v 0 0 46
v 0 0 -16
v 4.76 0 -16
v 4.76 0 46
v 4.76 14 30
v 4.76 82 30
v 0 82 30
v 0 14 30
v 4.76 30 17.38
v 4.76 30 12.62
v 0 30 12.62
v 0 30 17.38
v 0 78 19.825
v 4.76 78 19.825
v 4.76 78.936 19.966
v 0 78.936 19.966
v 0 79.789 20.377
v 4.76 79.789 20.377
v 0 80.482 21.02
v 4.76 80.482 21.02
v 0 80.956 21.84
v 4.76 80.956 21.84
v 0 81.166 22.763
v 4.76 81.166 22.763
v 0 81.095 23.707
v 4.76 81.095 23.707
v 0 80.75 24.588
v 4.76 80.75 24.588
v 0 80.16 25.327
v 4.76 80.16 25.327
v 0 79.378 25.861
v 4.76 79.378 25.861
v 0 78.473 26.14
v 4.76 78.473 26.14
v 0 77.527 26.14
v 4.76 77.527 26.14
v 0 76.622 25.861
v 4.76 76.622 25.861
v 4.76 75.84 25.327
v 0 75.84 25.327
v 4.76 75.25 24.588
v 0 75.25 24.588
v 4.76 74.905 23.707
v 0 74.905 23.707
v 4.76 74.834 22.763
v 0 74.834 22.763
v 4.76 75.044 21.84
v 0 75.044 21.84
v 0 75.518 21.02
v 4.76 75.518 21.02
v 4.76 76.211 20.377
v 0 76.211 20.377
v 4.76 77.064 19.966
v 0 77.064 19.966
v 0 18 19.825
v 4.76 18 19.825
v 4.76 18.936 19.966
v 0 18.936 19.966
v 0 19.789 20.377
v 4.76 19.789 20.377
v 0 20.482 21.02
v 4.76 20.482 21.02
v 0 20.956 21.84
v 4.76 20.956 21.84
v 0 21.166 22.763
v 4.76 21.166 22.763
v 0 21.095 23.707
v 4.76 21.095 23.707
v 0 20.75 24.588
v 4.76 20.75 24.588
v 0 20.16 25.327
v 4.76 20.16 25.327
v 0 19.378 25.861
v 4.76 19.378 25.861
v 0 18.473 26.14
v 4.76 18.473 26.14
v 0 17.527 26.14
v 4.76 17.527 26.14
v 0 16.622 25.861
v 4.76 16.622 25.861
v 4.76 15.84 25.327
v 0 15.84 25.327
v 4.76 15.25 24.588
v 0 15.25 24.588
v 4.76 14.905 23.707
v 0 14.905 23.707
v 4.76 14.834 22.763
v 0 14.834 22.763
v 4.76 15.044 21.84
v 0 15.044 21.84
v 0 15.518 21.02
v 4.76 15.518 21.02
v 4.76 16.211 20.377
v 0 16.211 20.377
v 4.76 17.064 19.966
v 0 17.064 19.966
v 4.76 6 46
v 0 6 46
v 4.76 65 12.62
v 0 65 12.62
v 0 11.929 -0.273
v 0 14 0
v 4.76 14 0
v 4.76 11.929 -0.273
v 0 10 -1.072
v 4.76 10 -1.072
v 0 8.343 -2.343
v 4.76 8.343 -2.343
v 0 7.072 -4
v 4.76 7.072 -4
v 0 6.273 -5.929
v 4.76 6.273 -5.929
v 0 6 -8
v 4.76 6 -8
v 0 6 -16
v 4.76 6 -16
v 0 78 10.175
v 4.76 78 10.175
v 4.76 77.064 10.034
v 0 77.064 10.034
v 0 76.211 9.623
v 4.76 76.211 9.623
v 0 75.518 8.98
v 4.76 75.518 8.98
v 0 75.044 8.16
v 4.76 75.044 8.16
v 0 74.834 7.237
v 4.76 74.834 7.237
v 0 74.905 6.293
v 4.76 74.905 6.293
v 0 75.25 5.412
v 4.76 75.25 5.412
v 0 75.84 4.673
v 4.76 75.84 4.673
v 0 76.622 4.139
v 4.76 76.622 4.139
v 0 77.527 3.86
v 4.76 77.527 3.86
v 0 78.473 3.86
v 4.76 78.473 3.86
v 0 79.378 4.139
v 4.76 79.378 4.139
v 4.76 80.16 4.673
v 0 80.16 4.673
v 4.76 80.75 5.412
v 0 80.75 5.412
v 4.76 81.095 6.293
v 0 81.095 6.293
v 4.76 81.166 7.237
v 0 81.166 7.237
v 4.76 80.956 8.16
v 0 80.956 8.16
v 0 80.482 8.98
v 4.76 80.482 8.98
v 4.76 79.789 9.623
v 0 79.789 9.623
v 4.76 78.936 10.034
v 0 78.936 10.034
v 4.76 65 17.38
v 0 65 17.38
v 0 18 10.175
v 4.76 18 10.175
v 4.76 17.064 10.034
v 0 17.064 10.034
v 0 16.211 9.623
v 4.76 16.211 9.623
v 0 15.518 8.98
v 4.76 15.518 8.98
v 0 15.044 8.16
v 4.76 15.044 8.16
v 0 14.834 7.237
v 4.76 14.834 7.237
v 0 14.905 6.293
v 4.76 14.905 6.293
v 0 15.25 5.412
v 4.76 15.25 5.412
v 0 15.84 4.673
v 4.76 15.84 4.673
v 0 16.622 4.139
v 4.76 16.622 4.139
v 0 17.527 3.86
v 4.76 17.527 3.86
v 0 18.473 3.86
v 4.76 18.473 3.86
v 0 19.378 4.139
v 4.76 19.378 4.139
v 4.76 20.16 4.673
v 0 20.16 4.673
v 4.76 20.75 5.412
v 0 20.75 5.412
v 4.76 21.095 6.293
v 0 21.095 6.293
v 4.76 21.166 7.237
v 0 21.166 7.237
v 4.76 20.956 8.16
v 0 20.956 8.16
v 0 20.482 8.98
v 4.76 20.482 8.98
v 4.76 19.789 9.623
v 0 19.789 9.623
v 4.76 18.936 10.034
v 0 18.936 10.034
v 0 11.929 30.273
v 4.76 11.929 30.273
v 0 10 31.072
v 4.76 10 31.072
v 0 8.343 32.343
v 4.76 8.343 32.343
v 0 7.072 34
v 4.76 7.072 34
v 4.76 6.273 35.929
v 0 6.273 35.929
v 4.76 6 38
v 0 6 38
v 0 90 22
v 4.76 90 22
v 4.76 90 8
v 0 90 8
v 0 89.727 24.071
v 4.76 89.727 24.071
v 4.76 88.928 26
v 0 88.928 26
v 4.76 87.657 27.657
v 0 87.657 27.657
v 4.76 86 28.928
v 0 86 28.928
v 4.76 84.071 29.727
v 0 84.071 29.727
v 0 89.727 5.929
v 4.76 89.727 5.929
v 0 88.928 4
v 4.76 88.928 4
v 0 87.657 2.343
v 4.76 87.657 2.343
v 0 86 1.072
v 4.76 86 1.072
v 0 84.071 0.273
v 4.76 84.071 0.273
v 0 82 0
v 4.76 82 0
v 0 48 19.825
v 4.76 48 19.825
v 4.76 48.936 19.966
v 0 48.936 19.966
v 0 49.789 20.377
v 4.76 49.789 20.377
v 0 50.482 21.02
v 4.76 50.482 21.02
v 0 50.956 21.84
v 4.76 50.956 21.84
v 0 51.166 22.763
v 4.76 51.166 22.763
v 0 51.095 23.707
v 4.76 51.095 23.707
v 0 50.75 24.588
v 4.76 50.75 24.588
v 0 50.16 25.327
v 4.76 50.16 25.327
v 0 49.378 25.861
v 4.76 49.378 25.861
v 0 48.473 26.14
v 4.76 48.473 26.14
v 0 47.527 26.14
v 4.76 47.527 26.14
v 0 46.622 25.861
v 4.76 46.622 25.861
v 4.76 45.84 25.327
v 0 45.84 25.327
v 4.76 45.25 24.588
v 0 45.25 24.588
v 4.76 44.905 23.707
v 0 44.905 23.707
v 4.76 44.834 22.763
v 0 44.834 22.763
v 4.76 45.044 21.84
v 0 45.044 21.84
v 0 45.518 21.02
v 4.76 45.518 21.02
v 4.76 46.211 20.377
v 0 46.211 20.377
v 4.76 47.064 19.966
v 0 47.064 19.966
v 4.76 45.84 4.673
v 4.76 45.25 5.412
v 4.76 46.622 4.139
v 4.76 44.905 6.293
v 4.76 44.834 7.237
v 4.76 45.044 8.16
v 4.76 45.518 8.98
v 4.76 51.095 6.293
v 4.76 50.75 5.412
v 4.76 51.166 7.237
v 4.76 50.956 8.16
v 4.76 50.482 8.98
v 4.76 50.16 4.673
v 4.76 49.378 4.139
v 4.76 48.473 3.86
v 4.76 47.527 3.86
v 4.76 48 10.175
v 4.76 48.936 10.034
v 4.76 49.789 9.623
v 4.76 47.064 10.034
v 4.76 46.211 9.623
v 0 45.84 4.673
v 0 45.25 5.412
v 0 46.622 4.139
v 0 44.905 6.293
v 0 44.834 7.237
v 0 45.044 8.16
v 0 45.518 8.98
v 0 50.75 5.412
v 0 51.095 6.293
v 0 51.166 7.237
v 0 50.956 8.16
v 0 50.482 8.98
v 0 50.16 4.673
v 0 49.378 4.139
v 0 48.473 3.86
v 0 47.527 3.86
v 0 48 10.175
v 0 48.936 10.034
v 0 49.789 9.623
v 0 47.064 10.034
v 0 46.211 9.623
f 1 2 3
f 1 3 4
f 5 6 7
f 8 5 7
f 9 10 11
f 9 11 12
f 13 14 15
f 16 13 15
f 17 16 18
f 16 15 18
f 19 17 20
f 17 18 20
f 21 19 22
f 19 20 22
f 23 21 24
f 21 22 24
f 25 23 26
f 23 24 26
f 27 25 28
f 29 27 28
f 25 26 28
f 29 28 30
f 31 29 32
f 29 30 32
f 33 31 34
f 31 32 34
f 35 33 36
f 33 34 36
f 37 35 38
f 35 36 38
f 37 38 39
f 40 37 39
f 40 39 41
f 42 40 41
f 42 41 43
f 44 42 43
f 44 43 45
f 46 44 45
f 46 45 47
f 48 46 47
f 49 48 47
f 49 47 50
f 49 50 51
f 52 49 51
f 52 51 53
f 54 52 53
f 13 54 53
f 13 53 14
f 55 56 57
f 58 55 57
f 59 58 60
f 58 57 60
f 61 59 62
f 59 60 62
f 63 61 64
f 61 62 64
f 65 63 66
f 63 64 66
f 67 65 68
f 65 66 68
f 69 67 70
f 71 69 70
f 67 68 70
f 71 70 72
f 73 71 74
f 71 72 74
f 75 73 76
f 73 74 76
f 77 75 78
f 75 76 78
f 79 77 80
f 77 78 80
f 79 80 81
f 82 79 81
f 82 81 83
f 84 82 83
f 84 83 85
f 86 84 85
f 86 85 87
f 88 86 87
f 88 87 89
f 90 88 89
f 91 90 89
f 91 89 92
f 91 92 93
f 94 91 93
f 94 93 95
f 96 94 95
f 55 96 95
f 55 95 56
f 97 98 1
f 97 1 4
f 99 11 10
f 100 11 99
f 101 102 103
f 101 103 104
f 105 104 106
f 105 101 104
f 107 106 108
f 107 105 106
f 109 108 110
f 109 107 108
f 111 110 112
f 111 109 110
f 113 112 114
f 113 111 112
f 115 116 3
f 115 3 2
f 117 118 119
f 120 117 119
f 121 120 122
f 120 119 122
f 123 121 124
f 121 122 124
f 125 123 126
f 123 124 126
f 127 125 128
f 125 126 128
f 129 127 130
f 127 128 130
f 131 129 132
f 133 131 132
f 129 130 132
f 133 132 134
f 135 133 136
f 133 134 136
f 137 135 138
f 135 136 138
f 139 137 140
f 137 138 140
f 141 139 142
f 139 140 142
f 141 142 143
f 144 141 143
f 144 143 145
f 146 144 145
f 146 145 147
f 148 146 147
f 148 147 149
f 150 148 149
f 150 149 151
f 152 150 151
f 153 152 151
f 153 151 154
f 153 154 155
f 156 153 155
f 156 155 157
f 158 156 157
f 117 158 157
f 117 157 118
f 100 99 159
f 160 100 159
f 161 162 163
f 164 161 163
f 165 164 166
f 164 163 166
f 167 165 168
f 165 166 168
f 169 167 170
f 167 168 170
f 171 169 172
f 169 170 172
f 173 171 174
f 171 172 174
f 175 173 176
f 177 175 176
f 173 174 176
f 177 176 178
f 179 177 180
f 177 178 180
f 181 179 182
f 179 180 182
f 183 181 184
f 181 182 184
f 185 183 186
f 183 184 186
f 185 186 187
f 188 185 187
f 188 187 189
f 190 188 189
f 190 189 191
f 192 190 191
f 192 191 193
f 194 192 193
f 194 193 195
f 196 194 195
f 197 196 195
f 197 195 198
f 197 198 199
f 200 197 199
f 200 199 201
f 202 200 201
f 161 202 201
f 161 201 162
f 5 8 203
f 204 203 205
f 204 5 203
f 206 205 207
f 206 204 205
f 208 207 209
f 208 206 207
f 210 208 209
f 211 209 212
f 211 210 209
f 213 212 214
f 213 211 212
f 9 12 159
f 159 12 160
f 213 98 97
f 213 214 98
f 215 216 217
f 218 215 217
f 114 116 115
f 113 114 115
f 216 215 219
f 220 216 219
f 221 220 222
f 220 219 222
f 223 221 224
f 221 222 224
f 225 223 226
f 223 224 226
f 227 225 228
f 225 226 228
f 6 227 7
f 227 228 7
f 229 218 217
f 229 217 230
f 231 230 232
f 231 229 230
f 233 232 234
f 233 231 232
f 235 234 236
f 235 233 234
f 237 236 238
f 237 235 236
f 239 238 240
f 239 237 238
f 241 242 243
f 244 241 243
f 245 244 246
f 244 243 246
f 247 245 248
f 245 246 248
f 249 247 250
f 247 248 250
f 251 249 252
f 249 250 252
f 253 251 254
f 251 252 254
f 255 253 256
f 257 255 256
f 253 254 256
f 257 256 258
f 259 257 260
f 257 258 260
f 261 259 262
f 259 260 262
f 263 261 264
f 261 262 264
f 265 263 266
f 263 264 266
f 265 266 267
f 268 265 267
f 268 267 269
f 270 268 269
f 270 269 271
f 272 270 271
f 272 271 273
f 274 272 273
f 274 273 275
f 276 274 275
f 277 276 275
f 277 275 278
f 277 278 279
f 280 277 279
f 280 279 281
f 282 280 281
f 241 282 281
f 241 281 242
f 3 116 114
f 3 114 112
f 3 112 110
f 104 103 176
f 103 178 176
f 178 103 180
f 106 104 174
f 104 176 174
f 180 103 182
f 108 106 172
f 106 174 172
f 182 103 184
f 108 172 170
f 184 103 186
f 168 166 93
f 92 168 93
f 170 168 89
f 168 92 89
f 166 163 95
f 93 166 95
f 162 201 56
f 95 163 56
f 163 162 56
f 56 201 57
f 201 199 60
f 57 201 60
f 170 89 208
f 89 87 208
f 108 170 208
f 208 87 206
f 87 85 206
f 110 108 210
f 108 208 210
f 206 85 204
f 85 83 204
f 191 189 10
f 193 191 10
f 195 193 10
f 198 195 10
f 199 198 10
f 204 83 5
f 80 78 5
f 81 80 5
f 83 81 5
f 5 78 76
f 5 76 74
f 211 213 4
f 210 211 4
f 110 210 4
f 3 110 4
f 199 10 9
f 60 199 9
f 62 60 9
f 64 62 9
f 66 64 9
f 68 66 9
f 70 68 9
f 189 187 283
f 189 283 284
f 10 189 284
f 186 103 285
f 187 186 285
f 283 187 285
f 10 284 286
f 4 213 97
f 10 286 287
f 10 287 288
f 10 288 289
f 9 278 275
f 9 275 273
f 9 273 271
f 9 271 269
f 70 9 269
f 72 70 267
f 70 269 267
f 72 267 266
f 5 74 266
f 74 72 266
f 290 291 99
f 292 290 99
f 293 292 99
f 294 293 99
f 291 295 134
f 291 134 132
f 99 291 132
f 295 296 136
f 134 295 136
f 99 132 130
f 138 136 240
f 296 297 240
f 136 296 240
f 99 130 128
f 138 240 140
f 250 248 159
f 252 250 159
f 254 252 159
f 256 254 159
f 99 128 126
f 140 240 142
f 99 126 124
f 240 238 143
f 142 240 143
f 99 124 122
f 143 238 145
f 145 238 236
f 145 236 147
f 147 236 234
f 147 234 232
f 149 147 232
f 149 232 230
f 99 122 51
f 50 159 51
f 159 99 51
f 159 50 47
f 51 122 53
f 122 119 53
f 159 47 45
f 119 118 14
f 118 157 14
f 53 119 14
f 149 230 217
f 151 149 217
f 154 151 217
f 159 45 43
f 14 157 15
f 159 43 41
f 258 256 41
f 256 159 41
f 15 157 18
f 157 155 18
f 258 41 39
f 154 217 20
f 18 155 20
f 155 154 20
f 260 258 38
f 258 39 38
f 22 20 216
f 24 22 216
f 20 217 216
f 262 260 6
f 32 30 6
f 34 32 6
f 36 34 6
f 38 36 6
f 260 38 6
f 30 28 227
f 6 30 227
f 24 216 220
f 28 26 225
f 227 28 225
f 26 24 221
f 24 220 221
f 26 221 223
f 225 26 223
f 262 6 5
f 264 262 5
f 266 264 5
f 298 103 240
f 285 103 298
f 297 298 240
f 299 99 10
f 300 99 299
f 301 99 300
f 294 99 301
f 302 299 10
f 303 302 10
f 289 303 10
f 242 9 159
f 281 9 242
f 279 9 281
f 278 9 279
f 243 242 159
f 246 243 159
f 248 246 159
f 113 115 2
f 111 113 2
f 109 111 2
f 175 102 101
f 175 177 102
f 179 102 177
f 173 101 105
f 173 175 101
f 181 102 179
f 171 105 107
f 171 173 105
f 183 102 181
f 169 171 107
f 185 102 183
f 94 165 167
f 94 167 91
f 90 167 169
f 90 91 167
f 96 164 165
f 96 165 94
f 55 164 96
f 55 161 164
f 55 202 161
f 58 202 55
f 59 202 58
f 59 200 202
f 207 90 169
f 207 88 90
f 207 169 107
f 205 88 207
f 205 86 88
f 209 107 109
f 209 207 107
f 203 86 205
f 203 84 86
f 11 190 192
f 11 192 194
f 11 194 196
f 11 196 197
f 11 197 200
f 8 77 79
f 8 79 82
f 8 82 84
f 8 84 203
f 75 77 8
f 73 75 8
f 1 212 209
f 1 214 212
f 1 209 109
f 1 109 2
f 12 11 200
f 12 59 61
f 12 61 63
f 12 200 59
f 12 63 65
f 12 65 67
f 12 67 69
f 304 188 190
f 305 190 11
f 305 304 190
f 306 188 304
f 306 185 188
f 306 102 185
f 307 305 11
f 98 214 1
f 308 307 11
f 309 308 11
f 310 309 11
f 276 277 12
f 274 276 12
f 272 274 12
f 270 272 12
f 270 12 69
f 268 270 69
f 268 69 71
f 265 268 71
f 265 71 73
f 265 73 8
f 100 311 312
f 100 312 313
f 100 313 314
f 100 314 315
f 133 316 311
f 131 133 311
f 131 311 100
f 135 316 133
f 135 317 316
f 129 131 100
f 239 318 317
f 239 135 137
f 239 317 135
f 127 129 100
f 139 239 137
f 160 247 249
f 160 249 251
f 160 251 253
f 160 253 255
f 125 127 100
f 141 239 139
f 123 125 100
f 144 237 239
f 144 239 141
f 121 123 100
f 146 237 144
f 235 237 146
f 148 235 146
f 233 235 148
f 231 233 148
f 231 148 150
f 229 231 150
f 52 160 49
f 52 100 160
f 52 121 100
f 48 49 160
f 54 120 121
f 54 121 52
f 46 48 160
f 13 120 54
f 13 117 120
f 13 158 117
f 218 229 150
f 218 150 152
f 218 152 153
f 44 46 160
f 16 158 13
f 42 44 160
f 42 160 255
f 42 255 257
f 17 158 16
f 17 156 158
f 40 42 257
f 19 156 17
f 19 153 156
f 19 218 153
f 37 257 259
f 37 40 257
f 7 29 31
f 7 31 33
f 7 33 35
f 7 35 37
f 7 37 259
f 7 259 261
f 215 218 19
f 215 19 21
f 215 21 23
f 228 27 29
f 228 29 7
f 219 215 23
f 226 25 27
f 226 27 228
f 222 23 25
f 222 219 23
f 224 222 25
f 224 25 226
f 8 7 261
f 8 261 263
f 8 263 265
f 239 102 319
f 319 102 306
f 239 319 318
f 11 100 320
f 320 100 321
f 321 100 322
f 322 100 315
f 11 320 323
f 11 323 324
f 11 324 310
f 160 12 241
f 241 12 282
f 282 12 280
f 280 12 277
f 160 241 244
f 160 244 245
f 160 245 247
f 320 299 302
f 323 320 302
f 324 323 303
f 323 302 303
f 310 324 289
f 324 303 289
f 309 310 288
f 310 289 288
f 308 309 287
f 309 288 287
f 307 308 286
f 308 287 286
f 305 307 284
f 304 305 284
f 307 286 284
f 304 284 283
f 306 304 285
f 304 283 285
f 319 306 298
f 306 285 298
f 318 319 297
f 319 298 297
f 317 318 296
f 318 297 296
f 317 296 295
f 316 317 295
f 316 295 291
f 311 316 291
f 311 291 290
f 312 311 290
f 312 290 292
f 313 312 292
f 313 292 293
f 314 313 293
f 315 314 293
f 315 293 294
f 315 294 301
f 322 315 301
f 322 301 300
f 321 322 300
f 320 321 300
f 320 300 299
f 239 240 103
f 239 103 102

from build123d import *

# Parameters (mm, degrees)
RESSALTO_EXTRUS_O1_DEPTH   = 30
ESBO_O2_W                  = 12
ESBO_O2_H                  = 94
CORTE_EXTRUS_O1_DEPTH      = 118.541482039
ESBO_O3_W                  = 30
ESBO_O3_H                  = 10
CORTE_EXTRUS_O2_DEPTH      = 118.541482039
ESBO_O4_W                  = 3.6
ESBO_O4_H                  = 30
CORTE_EXTRUS_O3_DEPTH      = 108.498837203
ESBO_O5_W                  = 56.4
ESBO_O5_H                  = 6
RESSALTO_EXTRUS_O2_DEPTH   = 16
ESBO_O6_W                  = 56.4
ESBO_O6_H                  = 6
RESSALTO_EXTRUS_O3_DEPTH   = 16
FILETE1_R                  = 8
FILETE2_R                  = 8
FILETE3_R                  = 8
FILETE4_R                  = 4
ESBO_O7_R                  = 3.175
CORTE_EXTRUS_O4_DEPTH      = 113.943171551
ESBO_O8_R                  = 3.25
CORTE_EXTRUS_O5_DEPTH      = 112.143870726
CORTE_EXTRUS_O6_DEPTH      = 113.943171551
CORTE_EXTRUS_O6_DEPTH_BACK = 1.24
ESBO_O9_W                  = 62
ESBO_O9_H                  = 90
ESBO_O10_W                 = 4.76
ESBO_O10_H                 = 130
CORTE_EXTRUS_O7_DEPTH      = 102.186252031
ESBO_O11_W                 = 4.76
ESBO_O11_H                 = 30
RESSALTO_EXTRUS_O4_DEPTH   = 4.76


with BuildPart() as part:
    # Esboço1 → Ressalto-extrusão1 (new body)
    with BuildSketch(Plane.XY):
        Polygon((0, 0), (0, 100), (60, 0), align=None)
    extrude(amount=RESSALTO_EXTRUS_O1_DEPTH)

    # Esboço2 → Corte-extrusão1 (cut, through all)
    with BuildSketch(Plane.ZY.offset(-6)):
        with Locations((24, 53)):
            Rectangle(ESBO_O2_W, ESBO_O2_H)
        with Locations((6, 53)):
            Rectangle(ESBO_O2_W, ESBO_O2_H)
    extrude(amount=-CORTE_EXTRUS_O1_DEPTH, mode=Mode.SUBTRACT)

    # Esboço3 → Corte-extrusão2 (cut, through all)
    with BuildSketch(Plane(origin=(6, 0, 0), x_dir=(0, 0, -1), z_dir=(1, 0, 0))):
        with Locations((-15, 95)):
            Rectangle(ESBO_O3_W, ESBO_O3_H)
    extrude(amount=-CORTE_EXTRUS_O2_DEPTH, mode=Mode.SUBTRACT)

    # Esboço4 → Corte-extrusão3 (cut, through all)
    with BuildSketch(Plane(origin=(0, 6, 0), x_dir=(1, 0, 0), z_dir=(0, 1, 0))):
        with Locations((58.2, -15)):
            Rectangle(ESBO_O4_W, ESBO_O4_H)
    extrude(amount=-CORTE_EXTRUS_O3_DEPTH, mode=Mode.SUBTRACT)

    # Esboço5 → Ressalto-extrusão2 (add)
    with BuildSketch(Plane.XY.offset(30)):
        with Locations((28.2, 3)):
            Rectangle(ESBO_O5_W, ESBO_O5_H)
    extrude(amount=RESSALTO_EXTRUS_O2_DEPTH)

    # Esboço6 → Ressalto-extrusão3 (add)
    with BuildSketch(Plane(origin=(0, 0, 0), x_dir=(-1, 0, 0), z_dir=(0, 0, -1))):
        with Locations((-28.2, 3)):
            Rectangle(ESBO_O6_W, ESBO_O6_H)
    extrude(amount=RESSALTO_EXTRUS_O3_DEPTH)

    # Filete1
    filete1_edges = [part.edges().sort_by_distance(p)[0] for p in [
        (3, 6, 0),
        (3, 6, 30),
    ]]
    fillet(filete1_edges, radius=FILETE1_R)

    # Filete2
    filete2_edges = [part.edges().sort_by_distance(p)[0] for p in [
        (56.4, 3, -16),
        (56.4, 3, 46),
    ]]
    fillet(filete2_edges, radius=FILETE2_R)

    # Filete3
    filete3_edges = [part.edges().sort_by_distance(p)[0] for p in [
        (3, 90, 30),
        (3, 90, 0),
    ]]
    fillet(filete3_edges, radius=FILETE3_R)

    # Filete4
    filete4_edges = [part.edges().sort_by_distance(p)[0] for p in [
        (31.2, 6, 18),
        (31.2, 6, 12),
    ]]
    fillet(filete4_edges, radius=FILETE4_R)

    # Esboço7 → Corte-extrusão4 (cut, through all)
    with BuildSketch(Plane(origin=(6, 0, 0), x_dir=(0, 0, -1), z_dir=(1, 0, 0))):
        with Locations((-23, 78)):
            Circle(ESBO_O7_R)
        with Locations((-23, 48)):
            Circle(ESBO_O7_R)
        with Locations((-23, 18)):
            Circle(ESBO_O7_R)
        with Locations(Location((-7, 18, 0), (0, 0, 180))):
            Circle(ESBO_O7_R)
        with Locations(Location((-7, 48, 0), (0, 0, 180))):
            Circle(ESBO_O7_R)
        with Locations(Location((-7, 78, 0), (0, 0, 180))):
            Circle(ESBO_O7_R)
    extrude(amount=-CORTE_EXTRUS_O4_DEPTH, mode=Mode.SUBTRACT)

    # Esboço8 → Corte-extrusão5 (cut, through all)
    with BuildSketch(Plane(origin=(0, 6, 0), x_dir=(1, 0, 0), z_dir=(0, 1, 0))):
        with Locations(Location((48.4, 8, 0), (0, 0, 270))):
            Circle(ESBO_O8_R)
        with Locations(Location((48.4, -38, 0), (0, 0, 270))):
            Circle(ESBO_O8_R)
        with Locations(Location((16.4, -38, 0), (0, 0, 270))):
            Circle(ESBO_O8_R)
        with Locations(Location((16.4, 8, 0), (0, 0, 270))):
            Circle(ESBO_O8_R)
    extrude(amount=-CORTE_EXTRUS_O5_DEPTH, mode=Mode.SUBTRACT)

    # Esboço9 → Corte-extrusão6 (cut, two sides: drawn at the far end of the back side and taken through both)
    with BuildSketch(Plane(origin=(6, 0, 0), x_dir=(0, 0, -1), z_dir=(1, 0, 0)).offset(-CORTE_EXTRUS_O6_DEPTH_BACK)):
        with Locations((-15, 45)):
            Rectangle(ESBO_O9_W, ESBO_O9_H)
    extrude(amount=CORTE_EXTRUS_O6_DEPTH + CORTE_EXTRUS_O6_DEPTH_BACK, mode=Mode.SUBTRACT)

    # Esboço10 → Corte-extrusão7 (cut, through all)
    with BuildSketch(Plane.ZY):
        with Locations((15, 0)):
            Rectangle(ESBO_O10_W, ESBO_O10_H)
    extrude(amount=-CORTE_EXTRUS_O7_DEPTH, mode=Mode.SUBTRACT)

    # Esboço11 → Ressalto-extrusão4 (add, through all)
    with BuildSketch(Plane.ZY):
        with Locations((15, 15)):
            Rectangle(ESBO_O11_W, ESBO_O11_H)
    extrude(amount=-RESSALTO_EXTRUS_O4_DEPTH)


solid = part.part
